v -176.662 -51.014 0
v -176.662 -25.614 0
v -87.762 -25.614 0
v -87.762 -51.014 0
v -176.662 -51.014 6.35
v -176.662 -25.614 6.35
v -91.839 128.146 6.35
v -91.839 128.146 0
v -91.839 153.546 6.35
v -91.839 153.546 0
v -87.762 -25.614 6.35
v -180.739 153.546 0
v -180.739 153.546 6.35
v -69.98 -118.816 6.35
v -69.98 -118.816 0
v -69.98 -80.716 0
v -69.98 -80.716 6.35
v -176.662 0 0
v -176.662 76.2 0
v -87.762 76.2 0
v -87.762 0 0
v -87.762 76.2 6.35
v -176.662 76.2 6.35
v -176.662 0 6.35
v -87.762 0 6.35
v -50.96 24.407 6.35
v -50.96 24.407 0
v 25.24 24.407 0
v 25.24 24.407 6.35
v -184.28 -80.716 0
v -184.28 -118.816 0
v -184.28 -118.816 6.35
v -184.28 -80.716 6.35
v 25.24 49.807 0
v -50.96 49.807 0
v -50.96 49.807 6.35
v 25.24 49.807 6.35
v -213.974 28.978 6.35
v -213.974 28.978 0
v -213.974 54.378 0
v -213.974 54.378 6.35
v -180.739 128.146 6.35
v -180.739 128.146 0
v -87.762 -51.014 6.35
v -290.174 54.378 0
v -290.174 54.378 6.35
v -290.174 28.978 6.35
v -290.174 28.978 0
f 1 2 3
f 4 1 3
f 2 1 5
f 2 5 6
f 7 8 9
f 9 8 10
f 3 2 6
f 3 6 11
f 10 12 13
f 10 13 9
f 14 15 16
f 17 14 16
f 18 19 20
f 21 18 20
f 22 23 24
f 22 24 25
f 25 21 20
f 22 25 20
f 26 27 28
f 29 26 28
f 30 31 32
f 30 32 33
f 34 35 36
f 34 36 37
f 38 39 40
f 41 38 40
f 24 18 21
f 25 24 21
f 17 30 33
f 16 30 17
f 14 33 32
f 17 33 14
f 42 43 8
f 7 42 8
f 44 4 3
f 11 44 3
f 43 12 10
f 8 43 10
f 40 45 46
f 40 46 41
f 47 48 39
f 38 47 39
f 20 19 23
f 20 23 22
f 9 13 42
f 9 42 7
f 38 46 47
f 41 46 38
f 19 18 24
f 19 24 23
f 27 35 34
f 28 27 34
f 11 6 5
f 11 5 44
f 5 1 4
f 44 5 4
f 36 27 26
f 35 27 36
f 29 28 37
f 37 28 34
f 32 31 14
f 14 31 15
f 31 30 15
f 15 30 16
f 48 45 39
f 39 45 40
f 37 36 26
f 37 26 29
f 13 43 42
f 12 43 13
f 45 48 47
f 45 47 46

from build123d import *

# Parameters (mm, degrees)
F1_W     = 76.2
F1_H     = 25.4
F2_DEPTH = 6.35
F1_W_2   = 88.9
F1_H_2   = 76.2
F1_W_3   = 114.3
F1_H_3   = 38.1


# Not quite as in the source:
# - a variable given as a bare number and used for a length is read in inches; the dataset says mm whatever the document's units were


with BuildPart() as f2:
    # F1 (on Top) → F2 (new body)
    with BuildSketch(Plane.XY):
        with Locations((-252.0737689972, 41.6781801403)):
            Rectangle(F1_W, F1_H)
    extrude(amount=F2_DEPTH)


with BuildPart() as f2b:
    # F1 (on Top) → F2, piece 2 (new body)
    with BuildSketch(Plane.XY):
        with Locations((-132.2115360975, 38.1)):
            Rectangle(F1_W_2, F1_H_2)
    extrude(amount=F2_DEPTH)


with BuildPart() as f2c:
    # F1 (on Top) → F2, piece 3 (new body)
    with BuildSketch(Plane.XY):
        with Locations((-136.2890268325, 140.8458990288)):
            Rectangle(F1_W_2, F1_H)
    extrude(amount=F2_DEPTH)


with BuildPart() as f2d:
    # F1 (on Top) → F2, piece 4 (new body)
    with BuildSketch(Plane.XY):
        with Locations((-127.1298143625, -99.7662639737)):
            Rectangle(F1_W_3, F1_H_3)
    extrude(amount=F2_DEPTH)


with BuildPart() as f2e:
    # F1 (on Top) → F2, piece 5 (new body)
    with BuildSketch(Plane.XY):
        with Locations((-132.2115360975, -38.3136596859)):
            Rectangle(F1_W_2, F1_H)
    extrude(amount=F2_DEPTH)


with BuildPart() as f2f:
    # F1 (on Top) → F2, piece 6 (new body)
    with BuildSketch(Plane.XY):
        with Locations((-12.8600751102, 37.1072154164)):
            Rectangle(F1_W, F1_H)
    extrude(amount=F2_DEPTH)


solid = Compound([f2.part, f2b.part, f2c.part, f2d.part, f2e.part, f2f.part])
